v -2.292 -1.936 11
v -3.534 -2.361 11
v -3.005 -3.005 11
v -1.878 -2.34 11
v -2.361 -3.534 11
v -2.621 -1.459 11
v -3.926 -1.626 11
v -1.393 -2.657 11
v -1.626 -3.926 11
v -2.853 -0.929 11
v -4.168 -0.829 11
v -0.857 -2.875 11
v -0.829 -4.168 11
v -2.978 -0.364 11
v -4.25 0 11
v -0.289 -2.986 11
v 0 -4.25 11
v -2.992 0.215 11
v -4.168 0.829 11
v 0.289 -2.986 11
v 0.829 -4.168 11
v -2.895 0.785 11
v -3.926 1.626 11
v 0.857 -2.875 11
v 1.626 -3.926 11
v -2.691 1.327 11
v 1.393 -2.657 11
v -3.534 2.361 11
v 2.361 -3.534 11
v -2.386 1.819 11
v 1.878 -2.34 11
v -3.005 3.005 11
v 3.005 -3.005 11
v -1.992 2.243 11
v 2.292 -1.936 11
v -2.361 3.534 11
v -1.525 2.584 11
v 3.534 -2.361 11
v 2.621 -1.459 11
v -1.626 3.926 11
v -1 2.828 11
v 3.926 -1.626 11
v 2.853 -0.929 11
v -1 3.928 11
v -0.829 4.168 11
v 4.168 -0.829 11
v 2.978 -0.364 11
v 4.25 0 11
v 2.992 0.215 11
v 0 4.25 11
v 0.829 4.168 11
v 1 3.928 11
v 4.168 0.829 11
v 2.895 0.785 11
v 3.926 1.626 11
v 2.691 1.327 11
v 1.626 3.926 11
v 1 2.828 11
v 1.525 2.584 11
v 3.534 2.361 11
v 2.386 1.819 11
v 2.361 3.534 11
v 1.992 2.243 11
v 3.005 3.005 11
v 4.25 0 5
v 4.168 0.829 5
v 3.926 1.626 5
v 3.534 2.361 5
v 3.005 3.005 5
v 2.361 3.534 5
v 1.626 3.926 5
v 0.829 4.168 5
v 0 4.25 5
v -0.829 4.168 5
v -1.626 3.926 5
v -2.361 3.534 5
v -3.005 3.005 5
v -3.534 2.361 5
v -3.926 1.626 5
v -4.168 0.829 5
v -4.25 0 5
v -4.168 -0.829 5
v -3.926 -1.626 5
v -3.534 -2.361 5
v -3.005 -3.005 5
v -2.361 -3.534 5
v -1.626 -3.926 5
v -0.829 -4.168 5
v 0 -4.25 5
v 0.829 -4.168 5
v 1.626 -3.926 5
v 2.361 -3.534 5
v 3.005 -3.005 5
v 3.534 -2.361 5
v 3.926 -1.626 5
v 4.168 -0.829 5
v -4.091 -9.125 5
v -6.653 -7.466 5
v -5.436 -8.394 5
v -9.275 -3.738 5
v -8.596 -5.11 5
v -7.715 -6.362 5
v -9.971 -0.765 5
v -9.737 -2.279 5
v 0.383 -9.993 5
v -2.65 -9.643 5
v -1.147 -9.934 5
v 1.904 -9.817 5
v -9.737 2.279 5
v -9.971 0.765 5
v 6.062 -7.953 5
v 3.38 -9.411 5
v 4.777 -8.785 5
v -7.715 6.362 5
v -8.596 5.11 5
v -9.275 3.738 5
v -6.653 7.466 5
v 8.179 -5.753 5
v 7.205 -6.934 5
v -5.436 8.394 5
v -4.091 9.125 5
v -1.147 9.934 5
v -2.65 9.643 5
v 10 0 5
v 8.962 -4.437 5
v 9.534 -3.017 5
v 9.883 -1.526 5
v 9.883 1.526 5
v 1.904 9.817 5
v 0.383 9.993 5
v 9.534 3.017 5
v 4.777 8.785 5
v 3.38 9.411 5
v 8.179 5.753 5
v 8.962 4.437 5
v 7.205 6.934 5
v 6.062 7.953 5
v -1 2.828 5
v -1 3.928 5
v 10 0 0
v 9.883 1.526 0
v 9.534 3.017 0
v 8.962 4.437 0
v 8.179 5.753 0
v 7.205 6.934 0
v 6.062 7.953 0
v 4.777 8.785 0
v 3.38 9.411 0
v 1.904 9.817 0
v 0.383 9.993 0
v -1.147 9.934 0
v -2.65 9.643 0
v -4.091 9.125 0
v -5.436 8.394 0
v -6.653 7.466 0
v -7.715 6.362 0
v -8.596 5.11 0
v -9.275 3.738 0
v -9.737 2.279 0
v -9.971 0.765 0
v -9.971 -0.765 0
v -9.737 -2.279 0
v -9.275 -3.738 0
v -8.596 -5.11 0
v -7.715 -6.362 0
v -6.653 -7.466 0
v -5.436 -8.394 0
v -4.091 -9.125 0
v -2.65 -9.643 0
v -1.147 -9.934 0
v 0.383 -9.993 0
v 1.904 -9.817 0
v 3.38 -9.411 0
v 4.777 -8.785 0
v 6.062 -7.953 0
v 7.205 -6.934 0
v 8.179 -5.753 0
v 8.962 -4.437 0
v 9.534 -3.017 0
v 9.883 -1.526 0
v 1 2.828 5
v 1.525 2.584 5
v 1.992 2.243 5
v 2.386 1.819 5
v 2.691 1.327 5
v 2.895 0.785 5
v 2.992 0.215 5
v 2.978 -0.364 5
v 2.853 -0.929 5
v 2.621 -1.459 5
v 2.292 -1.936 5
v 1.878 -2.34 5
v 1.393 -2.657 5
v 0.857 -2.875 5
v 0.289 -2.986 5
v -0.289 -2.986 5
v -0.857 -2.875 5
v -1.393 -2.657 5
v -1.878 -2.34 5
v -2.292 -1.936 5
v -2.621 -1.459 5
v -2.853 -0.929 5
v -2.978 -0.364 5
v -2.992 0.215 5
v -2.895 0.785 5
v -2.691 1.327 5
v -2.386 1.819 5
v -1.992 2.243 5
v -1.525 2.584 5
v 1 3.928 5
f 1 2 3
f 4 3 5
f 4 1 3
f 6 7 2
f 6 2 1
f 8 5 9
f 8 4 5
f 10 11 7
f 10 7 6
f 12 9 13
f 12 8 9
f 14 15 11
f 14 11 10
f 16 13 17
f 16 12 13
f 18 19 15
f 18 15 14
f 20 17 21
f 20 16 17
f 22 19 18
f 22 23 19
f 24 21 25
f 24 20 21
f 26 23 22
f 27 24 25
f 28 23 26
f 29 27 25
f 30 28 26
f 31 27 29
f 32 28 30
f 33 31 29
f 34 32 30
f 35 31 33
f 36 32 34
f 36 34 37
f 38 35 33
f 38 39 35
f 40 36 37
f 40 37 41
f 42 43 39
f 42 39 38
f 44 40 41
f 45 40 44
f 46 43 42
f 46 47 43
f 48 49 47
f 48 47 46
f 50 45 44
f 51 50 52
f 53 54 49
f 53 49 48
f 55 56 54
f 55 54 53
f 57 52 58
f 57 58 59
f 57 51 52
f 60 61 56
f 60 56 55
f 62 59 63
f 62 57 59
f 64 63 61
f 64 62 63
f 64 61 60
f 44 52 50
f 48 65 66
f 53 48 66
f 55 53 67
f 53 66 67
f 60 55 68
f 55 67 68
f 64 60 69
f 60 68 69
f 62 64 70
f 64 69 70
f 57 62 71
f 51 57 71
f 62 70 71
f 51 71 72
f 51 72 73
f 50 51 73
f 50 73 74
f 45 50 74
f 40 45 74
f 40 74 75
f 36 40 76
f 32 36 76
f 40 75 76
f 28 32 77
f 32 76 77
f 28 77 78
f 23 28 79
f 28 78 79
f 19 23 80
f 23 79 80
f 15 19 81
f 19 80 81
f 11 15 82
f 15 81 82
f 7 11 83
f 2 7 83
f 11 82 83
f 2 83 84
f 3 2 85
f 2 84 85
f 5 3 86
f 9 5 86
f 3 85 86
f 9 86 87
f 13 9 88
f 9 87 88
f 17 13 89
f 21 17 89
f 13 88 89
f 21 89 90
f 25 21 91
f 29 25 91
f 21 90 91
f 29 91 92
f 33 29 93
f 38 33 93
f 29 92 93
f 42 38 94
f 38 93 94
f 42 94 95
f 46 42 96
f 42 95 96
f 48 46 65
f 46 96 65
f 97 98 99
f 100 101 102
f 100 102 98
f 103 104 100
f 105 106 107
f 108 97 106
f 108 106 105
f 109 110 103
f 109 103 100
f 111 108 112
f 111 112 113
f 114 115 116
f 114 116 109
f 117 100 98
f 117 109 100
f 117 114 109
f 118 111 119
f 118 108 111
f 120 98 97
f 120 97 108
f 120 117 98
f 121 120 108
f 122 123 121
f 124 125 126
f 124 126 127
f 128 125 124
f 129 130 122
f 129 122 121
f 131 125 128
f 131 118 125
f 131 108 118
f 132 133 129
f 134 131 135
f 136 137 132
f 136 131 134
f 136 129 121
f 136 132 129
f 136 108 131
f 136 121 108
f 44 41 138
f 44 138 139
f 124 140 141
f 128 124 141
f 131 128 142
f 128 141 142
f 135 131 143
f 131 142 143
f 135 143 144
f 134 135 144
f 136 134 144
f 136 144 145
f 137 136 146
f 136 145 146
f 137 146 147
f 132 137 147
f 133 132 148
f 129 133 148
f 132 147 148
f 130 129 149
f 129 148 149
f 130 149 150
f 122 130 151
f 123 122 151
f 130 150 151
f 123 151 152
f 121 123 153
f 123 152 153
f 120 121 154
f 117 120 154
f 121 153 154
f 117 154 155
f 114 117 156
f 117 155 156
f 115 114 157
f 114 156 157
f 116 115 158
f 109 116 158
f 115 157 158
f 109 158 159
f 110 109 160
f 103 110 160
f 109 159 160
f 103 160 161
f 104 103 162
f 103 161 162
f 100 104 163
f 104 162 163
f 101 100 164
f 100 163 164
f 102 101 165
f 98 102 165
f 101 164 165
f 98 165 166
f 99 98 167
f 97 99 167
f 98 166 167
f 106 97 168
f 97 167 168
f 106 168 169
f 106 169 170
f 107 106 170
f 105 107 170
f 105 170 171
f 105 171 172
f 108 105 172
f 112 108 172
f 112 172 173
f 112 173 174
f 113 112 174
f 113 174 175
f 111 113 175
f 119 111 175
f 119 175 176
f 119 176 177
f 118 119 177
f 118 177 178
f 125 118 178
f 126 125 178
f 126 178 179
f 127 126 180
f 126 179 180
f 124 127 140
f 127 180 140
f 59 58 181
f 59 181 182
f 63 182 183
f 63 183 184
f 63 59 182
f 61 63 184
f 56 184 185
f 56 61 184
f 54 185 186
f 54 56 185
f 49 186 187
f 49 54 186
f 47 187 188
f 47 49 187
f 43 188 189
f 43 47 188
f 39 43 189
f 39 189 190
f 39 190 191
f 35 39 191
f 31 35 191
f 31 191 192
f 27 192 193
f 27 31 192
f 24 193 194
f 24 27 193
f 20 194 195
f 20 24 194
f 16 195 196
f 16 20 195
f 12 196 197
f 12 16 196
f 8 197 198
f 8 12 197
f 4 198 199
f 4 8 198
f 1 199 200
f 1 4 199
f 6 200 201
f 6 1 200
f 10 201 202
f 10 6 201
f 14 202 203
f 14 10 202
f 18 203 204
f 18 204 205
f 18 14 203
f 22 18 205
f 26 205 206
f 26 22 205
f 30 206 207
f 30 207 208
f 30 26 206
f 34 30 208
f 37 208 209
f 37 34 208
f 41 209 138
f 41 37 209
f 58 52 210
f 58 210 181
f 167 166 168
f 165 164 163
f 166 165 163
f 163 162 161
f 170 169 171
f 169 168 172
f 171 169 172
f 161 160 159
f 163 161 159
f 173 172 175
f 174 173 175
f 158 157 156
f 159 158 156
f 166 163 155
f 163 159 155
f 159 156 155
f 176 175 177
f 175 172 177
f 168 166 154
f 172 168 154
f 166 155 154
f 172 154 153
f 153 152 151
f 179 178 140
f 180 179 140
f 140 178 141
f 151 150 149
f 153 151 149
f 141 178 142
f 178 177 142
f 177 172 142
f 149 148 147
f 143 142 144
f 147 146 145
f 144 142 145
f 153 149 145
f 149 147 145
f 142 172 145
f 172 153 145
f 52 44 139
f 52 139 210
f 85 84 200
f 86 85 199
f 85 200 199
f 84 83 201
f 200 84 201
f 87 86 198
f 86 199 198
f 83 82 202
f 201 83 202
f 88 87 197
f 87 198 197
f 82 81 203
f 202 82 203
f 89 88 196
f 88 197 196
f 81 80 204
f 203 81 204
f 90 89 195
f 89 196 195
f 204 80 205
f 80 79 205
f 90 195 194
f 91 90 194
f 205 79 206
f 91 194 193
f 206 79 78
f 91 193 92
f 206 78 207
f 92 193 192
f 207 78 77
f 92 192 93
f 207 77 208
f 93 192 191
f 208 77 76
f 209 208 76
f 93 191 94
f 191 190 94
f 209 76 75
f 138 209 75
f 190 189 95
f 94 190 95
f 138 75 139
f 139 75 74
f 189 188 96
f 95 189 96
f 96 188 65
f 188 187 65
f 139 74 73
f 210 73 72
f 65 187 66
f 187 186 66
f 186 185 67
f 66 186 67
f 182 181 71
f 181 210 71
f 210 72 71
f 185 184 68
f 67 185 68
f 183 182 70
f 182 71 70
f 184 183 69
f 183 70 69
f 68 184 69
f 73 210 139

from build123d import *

# Parameters (mm, degrees)
SKETCH1_R           = 10
BOSS_EXTRUDE1_DEPTH = 5
SKETCH3_R           = 4.25
BOSS_EXTRUDE2_DEPTH = 6
CUT_EXTRUDE1_DEPTH  = 6


# Read off the part's stored shape, not the designer's step: Split1
with BuildPart() as part:
    # Sketch1 → Boss-Extrude1 (new body)
    with BuildSketch(Plane(origin=(0, 0, 0), x_dir=(0, 1, 0), z_dir=(0, 0, 1))):
        with Locations(Location((0, 0, 0), (0, 0, 270))):
            Circle(SKETCH1_R)
    extrude(amount=BOSS_EXTRUDE1_DEPTH)

    # Sketch3 → Boss-Extrude2 (add)
    with BuildSketch(Plane.XY.offset(5)):
        Circle(SKETCH3_R)
    extrude(amount=BOSS_EXTRUDE2_DEPTH)

    # Sketch2 → Cut-Extrude1 (cut)
    with BuildSketch(Plane.XY.offset(11)):
        with BuildLine():
            Line((-1, 3.928427125), (1, 3.928427125))
            Line((1, 3.928427125), (1, 2.828427125))
            ThreePointArc((1, 2.828427125), (0, -3), (-1, 2.828427125))
            Line((-1, 2.828427125), (-1, 3.928427125))
        make_face()
    extrude(amount=-CUT_EXTRUDE1_DEPTH, mode=Mode.SUBTRACT)


with BuildPart() as body_2:
    # Split1: the piece on the far side of the plane
    add(part.part)
    split(bisect_by=Plane.XY.offset(5), keep=Keep.BOTTOM)


with BuildPart() as part_1:
    add(part.part)

    # Split1
    split(bisect_by=Plane.XY.offset(5), keep=Keep.TOP)


solid = Compound([body_2.part, part_1.part])
